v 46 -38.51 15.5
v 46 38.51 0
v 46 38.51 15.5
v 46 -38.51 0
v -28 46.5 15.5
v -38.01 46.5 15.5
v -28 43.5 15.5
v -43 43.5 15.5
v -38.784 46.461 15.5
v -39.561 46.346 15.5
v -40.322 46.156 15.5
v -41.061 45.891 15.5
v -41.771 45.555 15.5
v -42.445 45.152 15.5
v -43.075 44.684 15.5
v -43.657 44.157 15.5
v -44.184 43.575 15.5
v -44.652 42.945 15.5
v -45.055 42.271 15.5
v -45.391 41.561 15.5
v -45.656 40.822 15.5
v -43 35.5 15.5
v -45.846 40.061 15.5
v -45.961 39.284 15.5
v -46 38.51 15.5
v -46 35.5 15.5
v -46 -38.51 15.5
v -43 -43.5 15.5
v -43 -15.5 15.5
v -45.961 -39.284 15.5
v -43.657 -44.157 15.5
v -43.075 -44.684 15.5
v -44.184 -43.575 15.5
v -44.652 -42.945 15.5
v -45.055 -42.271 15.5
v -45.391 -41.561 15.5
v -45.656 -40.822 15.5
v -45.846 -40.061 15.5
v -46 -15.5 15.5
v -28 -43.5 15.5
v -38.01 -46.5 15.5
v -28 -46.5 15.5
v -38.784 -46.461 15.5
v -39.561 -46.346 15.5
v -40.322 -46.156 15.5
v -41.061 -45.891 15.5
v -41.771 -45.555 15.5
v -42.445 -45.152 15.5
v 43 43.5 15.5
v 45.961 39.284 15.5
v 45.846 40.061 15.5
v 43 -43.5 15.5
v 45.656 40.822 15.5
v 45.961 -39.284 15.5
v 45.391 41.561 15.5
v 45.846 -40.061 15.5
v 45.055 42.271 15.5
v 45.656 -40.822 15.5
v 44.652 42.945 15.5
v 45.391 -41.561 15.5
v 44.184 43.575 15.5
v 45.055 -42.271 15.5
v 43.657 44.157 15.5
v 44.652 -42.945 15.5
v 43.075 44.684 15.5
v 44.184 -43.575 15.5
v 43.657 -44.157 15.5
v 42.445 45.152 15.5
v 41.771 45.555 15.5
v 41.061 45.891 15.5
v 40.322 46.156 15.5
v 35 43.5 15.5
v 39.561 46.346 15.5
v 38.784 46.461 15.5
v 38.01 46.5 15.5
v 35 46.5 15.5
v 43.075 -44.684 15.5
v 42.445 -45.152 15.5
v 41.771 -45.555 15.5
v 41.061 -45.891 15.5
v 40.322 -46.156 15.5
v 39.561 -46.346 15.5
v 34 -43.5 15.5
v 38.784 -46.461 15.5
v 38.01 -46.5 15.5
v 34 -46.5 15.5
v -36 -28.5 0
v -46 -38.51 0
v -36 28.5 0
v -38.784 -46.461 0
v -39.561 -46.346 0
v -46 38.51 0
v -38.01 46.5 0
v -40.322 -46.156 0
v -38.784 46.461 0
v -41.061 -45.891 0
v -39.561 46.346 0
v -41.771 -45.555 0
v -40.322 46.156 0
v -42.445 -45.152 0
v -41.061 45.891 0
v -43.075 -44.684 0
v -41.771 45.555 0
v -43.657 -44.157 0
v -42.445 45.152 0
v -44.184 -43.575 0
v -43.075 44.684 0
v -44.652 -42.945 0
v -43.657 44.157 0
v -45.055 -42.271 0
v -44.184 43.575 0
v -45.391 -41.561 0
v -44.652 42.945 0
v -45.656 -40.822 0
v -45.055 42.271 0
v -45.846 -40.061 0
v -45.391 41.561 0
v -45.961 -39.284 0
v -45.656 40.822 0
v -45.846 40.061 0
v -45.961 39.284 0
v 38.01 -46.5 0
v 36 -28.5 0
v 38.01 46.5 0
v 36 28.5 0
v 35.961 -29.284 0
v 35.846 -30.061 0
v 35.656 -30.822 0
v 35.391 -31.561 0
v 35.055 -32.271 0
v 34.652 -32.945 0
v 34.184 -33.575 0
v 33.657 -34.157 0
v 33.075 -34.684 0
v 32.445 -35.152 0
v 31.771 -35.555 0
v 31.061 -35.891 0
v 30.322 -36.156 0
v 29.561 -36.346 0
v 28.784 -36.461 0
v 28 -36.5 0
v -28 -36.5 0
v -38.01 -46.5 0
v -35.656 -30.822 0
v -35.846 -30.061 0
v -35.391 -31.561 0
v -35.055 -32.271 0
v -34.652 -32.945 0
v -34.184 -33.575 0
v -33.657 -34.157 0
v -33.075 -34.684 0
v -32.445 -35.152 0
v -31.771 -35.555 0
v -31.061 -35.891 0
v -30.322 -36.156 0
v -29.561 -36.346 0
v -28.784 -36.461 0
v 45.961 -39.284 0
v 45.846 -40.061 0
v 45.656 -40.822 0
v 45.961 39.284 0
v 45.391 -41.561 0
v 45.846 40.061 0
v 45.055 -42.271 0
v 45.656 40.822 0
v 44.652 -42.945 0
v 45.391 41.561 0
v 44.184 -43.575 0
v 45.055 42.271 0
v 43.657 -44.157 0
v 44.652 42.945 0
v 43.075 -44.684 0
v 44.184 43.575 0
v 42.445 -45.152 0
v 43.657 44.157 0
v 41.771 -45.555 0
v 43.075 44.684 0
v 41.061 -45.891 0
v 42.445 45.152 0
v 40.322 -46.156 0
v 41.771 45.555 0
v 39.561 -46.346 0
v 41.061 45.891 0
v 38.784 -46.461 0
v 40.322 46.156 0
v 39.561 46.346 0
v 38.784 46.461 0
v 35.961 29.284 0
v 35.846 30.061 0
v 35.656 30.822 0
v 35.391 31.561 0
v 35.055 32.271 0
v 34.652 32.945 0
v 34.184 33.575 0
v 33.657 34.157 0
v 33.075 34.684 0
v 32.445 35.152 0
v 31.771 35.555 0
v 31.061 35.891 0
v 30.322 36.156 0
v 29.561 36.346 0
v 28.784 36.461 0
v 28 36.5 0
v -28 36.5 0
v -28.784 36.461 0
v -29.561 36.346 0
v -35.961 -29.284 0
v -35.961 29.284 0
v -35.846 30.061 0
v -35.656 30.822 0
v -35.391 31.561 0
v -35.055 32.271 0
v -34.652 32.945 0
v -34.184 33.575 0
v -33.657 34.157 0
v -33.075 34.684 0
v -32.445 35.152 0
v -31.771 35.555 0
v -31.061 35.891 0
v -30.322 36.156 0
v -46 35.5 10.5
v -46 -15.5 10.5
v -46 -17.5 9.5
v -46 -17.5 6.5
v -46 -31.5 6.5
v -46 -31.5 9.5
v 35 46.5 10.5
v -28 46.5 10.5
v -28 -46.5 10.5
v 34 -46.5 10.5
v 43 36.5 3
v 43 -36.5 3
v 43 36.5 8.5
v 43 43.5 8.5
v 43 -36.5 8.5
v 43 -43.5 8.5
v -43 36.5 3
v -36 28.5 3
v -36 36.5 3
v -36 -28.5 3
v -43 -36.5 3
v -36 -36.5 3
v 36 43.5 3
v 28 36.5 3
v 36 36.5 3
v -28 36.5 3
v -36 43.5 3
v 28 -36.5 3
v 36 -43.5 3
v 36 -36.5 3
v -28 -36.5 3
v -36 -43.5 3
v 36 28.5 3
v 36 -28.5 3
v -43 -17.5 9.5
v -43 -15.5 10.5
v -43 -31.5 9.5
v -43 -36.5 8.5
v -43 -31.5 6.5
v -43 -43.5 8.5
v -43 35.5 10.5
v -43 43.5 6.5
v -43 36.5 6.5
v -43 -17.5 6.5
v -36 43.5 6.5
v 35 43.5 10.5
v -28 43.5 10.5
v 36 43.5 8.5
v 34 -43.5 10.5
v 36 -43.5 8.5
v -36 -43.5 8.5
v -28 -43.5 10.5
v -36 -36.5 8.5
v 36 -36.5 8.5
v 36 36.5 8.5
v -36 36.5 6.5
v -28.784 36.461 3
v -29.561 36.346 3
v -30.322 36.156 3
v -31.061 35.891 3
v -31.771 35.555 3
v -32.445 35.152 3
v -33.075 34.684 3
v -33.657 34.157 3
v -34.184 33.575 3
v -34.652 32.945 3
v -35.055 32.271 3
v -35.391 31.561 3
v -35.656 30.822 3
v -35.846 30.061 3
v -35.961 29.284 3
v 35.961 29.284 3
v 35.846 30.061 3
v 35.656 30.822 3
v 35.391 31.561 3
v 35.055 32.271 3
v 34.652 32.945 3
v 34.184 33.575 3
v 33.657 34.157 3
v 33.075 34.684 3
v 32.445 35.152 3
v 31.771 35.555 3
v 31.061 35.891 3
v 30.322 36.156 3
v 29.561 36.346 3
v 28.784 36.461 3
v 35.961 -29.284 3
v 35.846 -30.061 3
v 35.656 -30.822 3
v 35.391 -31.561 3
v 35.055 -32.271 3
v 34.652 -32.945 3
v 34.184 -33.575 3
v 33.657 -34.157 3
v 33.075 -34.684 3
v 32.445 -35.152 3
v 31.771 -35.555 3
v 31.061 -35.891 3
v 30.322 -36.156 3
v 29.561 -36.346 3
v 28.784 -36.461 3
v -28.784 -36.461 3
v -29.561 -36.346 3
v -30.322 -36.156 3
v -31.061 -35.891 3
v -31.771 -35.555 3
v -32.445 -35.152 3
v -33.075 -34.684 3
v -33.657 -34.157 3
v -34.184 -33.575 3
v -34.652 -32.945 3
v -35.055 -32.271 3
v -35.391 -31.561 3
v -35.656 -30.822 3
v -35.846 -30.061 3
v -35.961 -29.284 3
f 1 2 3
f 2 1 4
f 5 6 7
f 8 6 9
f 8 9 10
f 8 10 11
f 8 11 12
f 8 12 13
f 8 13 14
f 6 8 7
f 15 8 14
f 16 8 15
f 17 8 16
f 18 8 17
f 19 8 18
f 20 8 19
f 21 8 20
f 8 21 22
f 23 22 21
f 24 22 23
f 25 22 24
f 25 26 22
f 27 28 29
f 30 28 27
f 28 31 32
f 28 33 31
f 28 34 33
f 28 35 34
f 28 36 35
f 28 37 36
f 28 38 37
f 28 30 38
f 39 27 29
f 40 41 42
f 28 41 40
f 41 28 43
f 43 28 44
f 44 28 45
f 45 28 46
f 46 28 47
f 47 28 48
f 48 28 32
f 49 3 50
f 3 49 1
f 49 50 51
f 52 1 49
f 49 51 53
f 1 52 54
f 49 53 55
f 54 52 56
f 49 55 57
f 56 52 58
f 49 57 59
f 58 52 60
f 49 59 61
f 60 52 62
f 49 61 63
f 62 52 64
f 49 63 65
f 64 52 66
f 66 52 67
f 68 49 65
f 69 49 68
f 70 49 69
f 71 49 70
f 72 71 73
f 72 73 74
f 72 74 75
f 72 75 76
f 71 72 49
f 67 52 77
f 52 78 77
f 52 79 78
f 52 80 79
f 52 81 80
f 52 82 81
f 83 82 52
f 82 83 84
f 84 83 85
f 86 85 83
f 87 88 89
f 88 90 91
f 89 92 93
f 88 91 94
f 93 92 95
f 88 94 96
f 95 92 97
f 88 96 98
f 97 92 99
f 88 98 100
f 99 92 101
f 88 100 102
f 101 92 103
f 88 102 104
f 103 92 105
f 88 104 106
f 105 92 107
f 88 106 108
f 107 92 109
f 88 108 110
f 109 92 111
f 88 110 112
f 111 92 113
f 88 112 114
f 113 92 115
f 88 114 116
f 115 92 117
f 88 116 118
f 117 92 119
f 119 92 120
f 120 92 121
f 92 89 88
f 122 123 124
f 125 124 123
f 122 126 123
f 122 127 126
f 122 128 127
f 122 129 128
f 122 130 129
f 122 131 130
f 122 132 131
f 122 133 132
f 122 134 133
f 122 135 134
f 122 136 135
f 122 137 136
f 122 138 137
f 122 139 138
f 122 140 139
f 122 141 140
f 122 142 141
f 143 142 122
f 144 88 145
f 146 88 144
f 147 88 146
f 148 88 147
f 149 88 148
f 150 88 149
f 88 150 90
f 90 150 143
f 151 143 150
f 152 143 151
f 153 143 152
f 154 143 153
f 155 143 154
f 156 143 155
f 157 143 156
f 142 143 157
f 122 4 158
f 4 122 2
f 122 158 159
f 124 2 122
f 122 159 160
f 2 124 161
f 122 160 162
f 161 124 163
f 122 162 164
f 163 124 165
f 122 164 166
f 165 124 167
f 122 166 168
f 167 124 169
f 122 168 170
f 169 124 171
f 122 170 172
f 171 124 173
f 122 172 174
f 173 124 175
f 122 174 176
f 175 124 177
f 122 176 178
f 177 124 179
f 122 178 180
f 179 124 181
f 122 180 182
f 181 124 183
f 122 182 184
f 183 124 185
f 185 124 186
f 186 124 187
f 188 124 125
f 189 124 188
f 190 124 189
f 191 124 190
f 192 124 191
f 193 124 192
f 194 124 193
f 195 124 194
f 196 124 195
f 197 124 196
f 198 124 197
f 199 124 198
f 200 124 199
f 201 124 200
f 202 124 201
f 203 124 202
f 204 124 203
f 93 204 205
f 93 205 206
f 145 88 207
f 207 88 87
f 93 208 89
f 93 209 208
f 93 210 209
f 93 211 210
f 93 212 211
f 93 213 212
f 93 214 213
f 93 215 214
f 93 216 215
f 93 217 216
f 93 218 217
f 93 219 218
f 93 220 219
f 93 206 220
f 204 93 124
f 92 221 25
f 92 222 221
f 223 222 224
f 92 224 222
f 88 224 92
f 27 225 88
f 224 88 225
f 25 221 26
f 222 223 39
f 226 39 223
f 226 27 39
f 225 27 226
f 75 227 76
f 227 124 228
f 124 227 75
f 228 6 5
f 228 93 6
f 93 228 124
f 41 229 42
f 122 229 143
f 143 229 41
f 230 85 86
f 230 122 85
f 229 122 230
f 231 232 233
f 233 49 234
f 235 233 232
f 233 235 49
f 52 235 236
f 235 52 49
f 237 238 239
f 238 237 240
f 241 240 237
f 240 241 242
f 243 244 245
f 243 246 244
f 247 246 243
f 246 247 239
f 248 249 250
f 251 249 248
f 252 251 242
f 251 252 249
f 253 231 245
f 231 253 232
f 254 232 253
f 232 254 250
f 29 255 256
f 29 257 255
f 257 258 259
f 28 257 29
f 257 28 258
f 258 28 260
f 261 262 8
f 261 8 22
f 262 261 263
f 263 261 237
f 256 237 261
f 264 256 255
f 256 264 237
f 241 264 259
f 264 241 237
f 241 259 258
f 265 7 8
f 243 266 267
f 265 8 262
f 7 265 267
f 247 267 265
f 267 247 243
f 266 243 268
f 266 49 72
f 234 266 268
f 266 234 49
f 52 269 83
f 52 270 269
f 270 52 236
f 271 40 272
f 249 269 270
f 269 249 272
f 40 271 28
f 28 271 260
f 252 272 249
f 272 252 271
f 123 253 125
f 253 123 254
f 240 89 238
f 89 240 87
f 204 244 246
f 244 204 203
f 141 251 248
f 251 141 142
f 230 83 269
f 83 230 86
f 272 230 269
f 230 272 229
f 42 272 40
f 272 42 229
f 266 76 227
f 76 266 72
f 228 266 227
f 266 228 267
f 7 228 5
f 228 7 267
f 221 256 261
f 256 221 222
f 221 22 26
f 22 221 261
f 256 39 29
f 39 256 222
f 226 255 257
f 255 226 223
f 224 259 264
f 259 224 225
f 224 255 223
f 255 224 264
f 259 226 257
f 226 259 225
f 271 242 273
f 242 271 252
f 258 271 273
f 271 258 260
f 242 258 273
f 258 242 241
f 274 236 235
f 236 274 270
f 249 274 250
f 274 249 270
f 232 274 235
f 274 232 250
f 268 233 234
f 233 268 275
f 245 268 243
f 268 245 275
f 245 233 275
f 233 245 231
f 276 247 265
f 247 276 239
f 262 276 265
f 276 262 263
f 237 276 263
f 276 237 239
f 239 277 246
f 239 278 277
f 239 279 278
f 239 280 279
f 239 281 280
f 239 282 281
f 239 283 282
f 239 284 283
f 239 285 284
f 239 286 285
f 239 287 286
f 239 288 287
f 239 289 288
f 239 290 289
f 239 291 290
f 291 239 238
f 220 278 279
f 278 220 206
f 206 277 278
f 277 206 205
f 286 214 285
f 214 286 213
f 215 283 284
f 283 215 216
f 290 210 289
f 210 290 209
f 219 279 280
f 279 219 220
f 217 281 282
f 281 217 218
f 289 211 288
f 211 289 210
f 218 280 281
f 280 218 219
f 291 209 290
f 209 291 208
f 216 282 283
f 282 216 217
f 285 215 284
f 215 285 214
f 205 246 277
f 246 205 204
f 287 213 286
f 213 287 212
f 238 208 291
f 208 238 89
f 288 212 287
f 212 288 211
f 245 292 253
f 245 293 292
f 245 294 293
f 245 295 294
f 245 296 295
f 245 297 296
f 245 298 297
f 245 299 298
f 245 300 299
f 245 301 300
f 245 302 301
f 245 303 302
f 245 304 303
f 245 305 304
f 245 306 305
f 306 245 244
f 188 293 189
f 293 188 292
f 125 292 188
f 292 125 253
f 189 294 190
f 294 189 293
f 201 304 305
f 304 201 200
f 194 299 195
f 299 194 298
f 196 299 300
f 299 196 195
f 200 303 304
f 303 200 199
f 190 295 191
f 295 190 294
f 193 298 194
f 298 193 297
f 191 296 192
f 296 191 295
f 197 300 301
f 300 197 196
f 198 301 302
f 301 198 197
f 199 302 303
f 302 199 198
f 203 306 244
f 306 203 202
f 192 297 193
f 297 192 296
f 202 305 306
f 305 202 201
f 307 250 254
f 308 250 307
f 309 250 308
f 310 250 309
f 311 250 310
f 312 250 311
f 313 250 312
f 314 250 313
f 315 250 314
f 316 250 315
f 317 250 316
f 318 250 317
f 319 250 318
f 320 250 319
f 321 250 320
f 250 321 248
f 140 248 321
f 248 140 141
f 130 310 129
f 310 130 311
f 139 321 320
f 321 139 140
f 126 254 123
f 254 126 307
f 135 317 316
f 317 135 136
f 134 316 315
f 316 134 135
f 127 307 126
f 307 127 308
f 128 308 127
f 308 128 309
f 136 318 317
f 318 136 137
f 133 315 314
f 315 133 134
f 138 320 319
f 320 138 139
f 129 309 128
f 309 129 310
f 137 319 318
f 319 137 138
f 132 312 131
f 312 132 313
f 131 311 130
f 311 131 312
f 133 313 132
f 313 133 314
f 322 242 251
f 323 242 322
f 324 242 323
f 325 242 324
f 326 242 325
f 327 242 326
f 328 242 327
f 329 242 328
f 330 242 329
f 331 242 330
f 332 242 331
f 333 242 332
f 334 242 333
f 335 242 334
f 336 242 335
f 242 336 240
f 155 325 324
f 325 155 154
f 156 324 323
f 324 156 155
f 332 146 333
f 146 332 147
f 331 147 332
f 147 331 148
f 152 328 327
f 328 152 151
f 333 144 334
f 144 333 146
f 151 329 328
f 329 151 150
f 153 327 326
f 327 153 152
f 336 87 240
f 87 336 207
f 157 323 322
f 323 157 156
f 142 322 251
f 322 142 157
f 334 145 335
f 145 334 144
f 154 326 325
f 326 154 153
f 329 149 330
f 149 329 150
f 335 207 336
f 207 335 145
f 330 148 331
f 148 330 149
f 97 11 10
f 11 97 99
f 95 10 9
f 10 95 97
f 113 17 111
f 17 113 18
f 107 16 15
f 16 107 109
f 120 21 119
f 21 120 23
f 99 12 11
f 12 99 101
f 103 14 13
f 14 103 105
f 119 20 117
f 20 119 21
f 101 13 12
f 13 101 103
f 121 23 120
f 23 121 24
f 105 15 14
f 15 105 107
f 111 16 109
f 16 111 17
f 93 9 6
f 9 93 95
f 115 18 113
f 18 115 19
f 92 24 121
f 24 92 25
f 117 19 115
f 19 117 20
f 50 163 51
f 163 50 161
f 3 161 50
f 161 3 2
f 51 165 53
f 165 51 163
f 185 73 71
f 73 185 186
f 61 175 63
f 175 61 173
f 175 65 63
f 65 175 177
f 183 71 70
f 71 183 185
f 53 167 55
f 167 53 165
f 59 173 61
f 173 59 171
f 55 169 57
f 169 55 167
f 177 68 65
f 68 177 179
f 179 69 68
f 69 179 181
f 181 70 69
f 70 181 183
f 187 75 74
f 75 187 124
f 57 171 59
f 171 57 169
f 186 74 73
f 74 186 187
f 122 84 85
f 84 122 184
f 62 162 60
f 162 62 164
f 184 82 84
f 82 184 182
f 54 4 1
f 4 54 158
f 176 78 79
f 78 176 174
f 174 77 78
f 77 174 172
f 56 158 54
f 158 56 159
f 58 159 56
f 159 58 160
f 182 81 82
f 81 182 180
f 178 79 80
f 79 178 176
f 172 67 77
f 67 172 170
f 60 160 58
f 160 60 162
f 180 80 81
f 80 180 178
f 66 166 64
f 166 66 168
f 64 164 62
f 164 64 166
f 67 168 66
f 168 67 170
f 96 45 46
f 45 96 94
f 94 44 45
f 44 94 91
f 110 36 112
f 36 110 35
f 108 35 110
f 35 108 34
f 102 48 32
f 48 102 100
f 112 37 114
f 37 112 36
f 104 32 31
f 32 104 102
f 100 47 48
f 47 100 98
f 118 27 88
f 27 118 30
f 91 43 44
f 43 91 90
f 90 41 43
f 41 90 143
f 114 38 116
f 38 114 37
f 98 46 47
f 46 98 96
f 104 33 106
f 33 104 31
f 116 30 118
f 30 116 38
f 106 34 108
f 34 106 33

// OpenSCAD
// Box for beagleboard, (c) 2010 - Koen Kooi, licensed under CC-BY-SA

// lenght of PCB
inside_length = 87;

// width of PCB
inside_w = 86;

// outside wall thickness
edge_thickness = 3;
stud_height = edge_thickness + 3.5 +2;

// Set this to zero have a 'coaster' instead of a box
extra_height = 5;

// stud is inside the wall but aligned to the bottom, 
// so its stud_size x stud_size x (stud_height - edge_thickness) big
stud_size = 7;
pcb_thickness = 2;

// Round the inside and outside corners
use_rounded_corners = 1; // 0,1

inside_corner_radius = 8;
corner_radius = 8;

box_width = inside_w + (edge_thickness * 2); 
box_length = inside_length + (edge_thickness * 2);
box_height = stud_height + pcb_thickness + extra_height;

translate(v = [ -box_width / 2, -box_length / 2, 0]) {   
  if(use_rounded_corners == 1) {
    roundedbox(box_width, box_length, box_height, edge_thickness, stud_size);
  } else {
    plainbox(box_width, box_length, box_height, edge_thickness, stud_size);
  }
}

module plainbox(box_width, box_length, box_height, edge_thickness, stud_size) {
  union() {
    difference() {
      //outside
      cube([box_width, box_length, box_height]);
      //inside
      translate(v = [edge_thickness, edge_thickness, edge_thickness]) {  
        cube([inside_w, inside_length, box_height]);
      }
      translate(v = [stud_size + edge_thickness, stud_size + edge_thickness, -edge_thickness]) {  
        cube([inside_w - 2 * stud_size, inside_length - 2 * stud_size, box_height]);
      }
      //audio + hdmi: 62mm long, 15mm corner offset
      translate(v = [15 + edge_thickness, -0.01, stud_height + pcb_thickness]) {
        cube([62, edge_thickness + 0.02, extra_height + 0.01], center=false);
      }
      //eth + usb: 63mm long, 15mm corner offset
      translate(v = [15 + edge_thickness, box_length - edge_thickness - 0.01, stud_height + pcb_thickness]) {
        cube([63, edge_thickness + 0.02, extra_height + 0.01], center=false);
      }
      //power + otg + serial: 51mm long, 28mm corner offset
      translate(v = [-0.01, 28 + edge_thickness, stud_height + pcb_thickness]) {
        cube([edge_thickness + 0.02, 51, extra_height + 0.01], center=false);
      }
      //microsd: 14mm long, 12mm corner offset
      translate(v = [-0.01, 12 + edge_thickness, stud_height - pcb_thickness]) {
        cube([edge_thickness + 0.02, 14, pcb_thickness * 1.5], center=false);
      }
    } // end difference
    //support studs
    translate(v = [edge_thickness, edge_thickness, 0]) {
      cube([stud_size, stud_size, stud_height], center = false);
    }
    translate(v = [box_width - stud_size - edge_thickness, edge_thickness, 0]) {
      cube([stud_size, stud_size, stud_height], center = false);
    }
    translate(v = [box_width - stud_size - edge_thickness, box_length - stud_size - edge_thickness, 0]) {
      cube([stud_size, stud_size, stud_height], center = false);
    }
    translate(v = [edge_thickness, box_length - stud_size - edge_thickness, 0]) {
      // lower stud due to serial header
      cube([stud_size, stud_size, stud_height -2], center = false);
    }
  } // end union
}

module roundedbox(box_width, box_length, box_height, edge_thickness, stud_size) {
  difference() {
    union() {
      plainbox(box_width, box_length, box_height, edge_thickness, stud_size);
  
        //rounded corner topleft
        translate(v = [edge_thickness + stud_size, box_length - edge_thickness - stud_size, 0]) {
          difference() {
            translate(v=[0,-inside_corner_radius,0]) {
              cube([inside_corner_radius,inside_corner_radius,edge_thickness]);
            }
            translate(v=[inside_corner_radius, -inside_corner_radius, -edge_thickness]) {
              cylinder(r=inside_corner_radius, h=3*edge_thickness, $fn=64);
            }
          }
        }
        //rounded corner topright
        translate(v = [box_width - edge_thickness - stud_size, box_length - edge_thickness - stud_size, 0]) {
          difference() {
            translate(v=[-inside_corner_radius,-inside_corner_radius,0]) {
              cube([inside_corner_radius,inside_corner_radius,edge_thickness]);
            }
            translate(v=[-inside_corner_radius, -inside_corner_radius, -edge_thickness]) {
              cylinder(r=inside_corner_radius, h=3*edge_thickness, $fn=64);
            }
          }
        }
        //rounded corner bottomright
        translate(v = [box_width - edge_thickness - stud_size, edge_thickness + stud_size, 0]) {
          difference() {
            translate(v=[-inside_corner_radius,0,0]) {
              cube([inside_corner_radius,inside_corner_radius,edge_thickness]);
            }
            translate(v=[-inside_corner_radius, inside_corner_radius, -edge_thickness]) {
              cylinder(r=inside_corner_radius, h=3*edge_thickness, $fn=64);
            }
          }
        }
        //rounded corner bottomleft
        translate(v = [edge_thickness + stud_size, edge_thickness + stud_size, 0]) {
          difference() {
            translate(v=[0,0,0]) {
              cube([inside_corner_radius,inside_corner_radius,edge_thickness]);
            }
            translate(v=[inside_corner_radius, inside_corner_radius, -edge_thickness]) {
              cylinder(r=inside_corner_radius, h=3*edge_thickness, $fn=64);
            }
          }
        }
    } //end union

    //rounded corner topleft
    translate(v = [0, box_length, 0]) {
      difference() {
        translate(v=[0 - 0.01,-corner_radius + 0.01, -0.5 * box_height]) {
          cube([corner_radius,corner_radius,2*box_height]);
        }
        translate(v=[corner_radius, -corner_radius, -0.5 * box_height]) {
          cylinder(r=corner_radius, h=2*box_height, $fn=64);
        }
      }
    }
    //rounded corner topright
    translate(v = [box_width, box_length, 0]) {
      difference() {
        translate(v=[-corner_radius + 0.01,-corner_radius + 0.01, -0.5 * box_height]) {
          cube([corner_radius,corner_radius,2*box_height]);
        }
        translate(v=[-corner_radius, -corner_radius, -0.5 * box_height]) {
          cylinder(r=corner_radius, h=2*box_height, $fn=64);
        }
      }
    }
    //rounded corner bottomright
    translate(v = [box_width, 0, 0]) {
      difference() {
        translate(v=[-corner_radius + 0.01,0 - 0.01, -0.5 * box_height]) {
          cube([corner_radius,corner_radius,2*box_height]);
        }
        translate(v=[-corner_radius, corner_radius, -0.5 * box_height]) {
          cylinder(r=corner_radius, h=2*box_height, $fn=64);
        }
      }
    }
    //rounded corner bottomleft
    translate(v = [0, 0, 0]) {
      difference() {
        translate(v=[0-0.01, -0.01, -0.5 * box_height]) {
          cube([corner_radius ,corner_radius,2*box_height]);
        }
        translate(v=[corner_radius, corner_radius, -0.5 * box_height]) {
          cylinder(r=corner_radius, h=2*box_height, $fn=64);
        }
      }
    }
  } //end difference
}
